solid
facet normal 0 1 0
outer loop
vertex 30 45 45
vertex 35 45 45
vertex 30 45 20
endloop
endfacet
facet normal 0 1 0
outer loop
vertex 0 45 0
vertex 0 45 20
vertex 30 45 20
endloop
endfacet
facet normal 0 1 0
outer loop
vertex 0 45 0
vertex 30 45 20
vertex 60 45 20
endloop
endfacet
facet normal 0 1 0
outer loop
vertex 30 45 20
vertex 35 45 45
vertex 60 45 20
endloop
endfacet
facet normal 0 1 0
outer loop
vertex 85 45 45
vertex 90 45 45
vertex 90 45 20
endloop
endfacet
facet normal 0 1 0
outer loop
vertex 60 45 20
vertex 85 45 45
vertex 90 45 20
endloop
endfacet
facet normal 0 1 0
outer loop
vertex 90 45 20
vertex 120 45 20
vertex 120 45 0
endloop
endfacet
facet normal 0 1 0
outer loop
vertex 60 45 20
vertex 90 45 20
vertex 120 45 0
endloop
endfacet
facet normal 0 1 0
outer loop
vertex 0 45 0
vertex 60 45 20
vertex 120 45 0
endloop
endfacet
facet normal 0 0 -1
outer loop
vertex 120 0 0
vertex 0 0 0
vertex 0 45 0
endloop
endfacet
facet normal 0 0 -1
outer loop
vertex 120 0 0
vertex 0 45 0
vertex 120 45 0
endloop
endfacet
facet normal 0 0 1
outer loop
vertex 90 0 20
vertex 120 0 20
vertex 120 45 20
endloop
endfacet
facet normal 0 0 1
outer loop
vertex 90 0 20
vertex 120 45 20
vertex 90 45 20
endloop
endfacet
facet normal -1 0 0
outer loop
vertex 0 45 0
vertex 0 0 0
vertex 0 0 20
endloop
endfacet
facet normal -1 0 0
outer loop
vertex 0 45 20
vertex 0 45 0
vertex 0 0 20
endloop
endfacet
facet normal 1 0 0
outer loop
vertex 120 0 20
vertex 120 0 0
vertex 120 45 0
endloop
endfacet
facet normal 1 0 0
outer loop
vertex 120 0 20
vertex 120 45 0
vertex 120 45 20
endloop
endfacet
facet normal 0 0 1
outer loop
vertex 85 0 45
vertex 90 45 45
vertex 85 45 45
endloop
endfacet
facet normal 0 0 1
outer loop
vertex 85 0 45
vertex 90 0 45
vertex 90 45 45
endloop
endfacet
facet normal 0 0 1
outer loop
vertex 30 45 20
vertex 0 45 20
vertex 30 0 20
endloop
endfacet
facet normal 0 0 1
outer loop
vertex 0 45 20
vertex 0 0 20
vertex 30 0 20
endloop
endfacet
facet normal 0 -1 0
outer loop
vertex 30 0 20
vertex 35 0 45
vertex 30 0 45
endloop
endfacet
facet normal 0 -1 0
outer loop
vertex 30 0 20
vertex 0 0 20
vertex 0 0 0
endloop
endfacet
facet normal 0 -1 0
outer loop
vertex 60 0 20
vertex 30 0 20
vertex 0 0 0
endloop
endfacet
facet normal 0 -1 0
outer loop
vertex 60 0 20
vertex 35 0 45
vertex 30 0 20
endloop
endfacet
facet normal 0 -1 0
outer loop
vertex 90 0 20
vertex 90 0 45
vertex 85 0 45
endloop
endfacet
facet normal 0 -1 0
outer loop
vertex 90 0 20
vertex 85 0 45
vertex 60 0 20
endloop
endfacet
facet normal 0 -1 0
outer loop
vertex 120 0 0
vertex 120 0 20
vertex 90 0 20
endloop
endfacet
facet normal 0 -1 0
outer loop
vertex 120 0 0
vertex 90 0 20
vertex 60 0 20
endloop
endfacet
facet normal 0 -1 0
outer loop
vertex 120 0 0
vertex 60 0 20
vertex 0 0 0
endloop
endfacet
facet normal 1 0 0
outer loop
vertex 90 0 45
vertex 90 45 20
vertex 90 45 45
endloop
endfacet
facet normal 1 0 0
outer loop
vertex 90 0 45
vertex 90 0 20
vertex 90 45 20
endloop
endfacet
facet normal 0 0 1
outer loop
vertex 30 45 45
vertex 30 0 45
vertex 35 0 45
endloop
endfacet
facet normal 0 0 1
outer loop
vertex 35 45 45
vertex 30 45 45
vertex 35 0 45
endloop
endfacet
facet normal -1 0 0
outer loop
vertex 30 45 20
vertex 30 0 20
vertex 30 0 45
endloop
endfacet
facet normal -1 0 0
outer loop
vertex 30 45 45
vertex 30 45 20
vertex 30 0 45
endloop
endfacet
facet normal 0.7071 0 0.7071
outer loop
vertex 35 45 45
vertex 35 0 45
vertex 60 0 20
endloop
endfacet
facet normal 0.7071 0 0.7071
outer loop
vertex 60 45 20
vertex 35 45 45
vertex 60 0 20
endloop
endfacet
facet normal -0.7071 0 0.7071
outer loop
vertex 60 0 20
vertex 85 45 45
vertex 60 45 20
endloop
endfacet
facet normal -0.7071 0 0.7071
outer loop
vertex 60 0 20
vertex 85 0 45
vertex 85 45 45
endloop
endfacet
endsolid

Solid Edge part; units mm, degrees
sketch "Sketch1" plane through (0, 0, 0) normal (0, -1, 0) x (1, 0, 0)
  line L0 (90, 20) -> (90, 45)
  line L1 (90, 45) -> (85, 45)
  line L2 (85, 45) -> (60, 20)
  line L3 (35, 45) -> (60, 20)
  line L4 (30, 45) -> (35, 45)
  line L5 (30, 20) -> (30, 45)
  line L6 (0, 20) -> (30, 20)
  line L7 (0, 0) -> (0, 20)
  line L8 (0, 0) -> (120, 0)
  line L9 (120, 0) -> (120, 20)
  line L10 (120, 20) -> (90, 20)
extrude "Protrusion1" add sketch "Sketch1" against normal blind 45
